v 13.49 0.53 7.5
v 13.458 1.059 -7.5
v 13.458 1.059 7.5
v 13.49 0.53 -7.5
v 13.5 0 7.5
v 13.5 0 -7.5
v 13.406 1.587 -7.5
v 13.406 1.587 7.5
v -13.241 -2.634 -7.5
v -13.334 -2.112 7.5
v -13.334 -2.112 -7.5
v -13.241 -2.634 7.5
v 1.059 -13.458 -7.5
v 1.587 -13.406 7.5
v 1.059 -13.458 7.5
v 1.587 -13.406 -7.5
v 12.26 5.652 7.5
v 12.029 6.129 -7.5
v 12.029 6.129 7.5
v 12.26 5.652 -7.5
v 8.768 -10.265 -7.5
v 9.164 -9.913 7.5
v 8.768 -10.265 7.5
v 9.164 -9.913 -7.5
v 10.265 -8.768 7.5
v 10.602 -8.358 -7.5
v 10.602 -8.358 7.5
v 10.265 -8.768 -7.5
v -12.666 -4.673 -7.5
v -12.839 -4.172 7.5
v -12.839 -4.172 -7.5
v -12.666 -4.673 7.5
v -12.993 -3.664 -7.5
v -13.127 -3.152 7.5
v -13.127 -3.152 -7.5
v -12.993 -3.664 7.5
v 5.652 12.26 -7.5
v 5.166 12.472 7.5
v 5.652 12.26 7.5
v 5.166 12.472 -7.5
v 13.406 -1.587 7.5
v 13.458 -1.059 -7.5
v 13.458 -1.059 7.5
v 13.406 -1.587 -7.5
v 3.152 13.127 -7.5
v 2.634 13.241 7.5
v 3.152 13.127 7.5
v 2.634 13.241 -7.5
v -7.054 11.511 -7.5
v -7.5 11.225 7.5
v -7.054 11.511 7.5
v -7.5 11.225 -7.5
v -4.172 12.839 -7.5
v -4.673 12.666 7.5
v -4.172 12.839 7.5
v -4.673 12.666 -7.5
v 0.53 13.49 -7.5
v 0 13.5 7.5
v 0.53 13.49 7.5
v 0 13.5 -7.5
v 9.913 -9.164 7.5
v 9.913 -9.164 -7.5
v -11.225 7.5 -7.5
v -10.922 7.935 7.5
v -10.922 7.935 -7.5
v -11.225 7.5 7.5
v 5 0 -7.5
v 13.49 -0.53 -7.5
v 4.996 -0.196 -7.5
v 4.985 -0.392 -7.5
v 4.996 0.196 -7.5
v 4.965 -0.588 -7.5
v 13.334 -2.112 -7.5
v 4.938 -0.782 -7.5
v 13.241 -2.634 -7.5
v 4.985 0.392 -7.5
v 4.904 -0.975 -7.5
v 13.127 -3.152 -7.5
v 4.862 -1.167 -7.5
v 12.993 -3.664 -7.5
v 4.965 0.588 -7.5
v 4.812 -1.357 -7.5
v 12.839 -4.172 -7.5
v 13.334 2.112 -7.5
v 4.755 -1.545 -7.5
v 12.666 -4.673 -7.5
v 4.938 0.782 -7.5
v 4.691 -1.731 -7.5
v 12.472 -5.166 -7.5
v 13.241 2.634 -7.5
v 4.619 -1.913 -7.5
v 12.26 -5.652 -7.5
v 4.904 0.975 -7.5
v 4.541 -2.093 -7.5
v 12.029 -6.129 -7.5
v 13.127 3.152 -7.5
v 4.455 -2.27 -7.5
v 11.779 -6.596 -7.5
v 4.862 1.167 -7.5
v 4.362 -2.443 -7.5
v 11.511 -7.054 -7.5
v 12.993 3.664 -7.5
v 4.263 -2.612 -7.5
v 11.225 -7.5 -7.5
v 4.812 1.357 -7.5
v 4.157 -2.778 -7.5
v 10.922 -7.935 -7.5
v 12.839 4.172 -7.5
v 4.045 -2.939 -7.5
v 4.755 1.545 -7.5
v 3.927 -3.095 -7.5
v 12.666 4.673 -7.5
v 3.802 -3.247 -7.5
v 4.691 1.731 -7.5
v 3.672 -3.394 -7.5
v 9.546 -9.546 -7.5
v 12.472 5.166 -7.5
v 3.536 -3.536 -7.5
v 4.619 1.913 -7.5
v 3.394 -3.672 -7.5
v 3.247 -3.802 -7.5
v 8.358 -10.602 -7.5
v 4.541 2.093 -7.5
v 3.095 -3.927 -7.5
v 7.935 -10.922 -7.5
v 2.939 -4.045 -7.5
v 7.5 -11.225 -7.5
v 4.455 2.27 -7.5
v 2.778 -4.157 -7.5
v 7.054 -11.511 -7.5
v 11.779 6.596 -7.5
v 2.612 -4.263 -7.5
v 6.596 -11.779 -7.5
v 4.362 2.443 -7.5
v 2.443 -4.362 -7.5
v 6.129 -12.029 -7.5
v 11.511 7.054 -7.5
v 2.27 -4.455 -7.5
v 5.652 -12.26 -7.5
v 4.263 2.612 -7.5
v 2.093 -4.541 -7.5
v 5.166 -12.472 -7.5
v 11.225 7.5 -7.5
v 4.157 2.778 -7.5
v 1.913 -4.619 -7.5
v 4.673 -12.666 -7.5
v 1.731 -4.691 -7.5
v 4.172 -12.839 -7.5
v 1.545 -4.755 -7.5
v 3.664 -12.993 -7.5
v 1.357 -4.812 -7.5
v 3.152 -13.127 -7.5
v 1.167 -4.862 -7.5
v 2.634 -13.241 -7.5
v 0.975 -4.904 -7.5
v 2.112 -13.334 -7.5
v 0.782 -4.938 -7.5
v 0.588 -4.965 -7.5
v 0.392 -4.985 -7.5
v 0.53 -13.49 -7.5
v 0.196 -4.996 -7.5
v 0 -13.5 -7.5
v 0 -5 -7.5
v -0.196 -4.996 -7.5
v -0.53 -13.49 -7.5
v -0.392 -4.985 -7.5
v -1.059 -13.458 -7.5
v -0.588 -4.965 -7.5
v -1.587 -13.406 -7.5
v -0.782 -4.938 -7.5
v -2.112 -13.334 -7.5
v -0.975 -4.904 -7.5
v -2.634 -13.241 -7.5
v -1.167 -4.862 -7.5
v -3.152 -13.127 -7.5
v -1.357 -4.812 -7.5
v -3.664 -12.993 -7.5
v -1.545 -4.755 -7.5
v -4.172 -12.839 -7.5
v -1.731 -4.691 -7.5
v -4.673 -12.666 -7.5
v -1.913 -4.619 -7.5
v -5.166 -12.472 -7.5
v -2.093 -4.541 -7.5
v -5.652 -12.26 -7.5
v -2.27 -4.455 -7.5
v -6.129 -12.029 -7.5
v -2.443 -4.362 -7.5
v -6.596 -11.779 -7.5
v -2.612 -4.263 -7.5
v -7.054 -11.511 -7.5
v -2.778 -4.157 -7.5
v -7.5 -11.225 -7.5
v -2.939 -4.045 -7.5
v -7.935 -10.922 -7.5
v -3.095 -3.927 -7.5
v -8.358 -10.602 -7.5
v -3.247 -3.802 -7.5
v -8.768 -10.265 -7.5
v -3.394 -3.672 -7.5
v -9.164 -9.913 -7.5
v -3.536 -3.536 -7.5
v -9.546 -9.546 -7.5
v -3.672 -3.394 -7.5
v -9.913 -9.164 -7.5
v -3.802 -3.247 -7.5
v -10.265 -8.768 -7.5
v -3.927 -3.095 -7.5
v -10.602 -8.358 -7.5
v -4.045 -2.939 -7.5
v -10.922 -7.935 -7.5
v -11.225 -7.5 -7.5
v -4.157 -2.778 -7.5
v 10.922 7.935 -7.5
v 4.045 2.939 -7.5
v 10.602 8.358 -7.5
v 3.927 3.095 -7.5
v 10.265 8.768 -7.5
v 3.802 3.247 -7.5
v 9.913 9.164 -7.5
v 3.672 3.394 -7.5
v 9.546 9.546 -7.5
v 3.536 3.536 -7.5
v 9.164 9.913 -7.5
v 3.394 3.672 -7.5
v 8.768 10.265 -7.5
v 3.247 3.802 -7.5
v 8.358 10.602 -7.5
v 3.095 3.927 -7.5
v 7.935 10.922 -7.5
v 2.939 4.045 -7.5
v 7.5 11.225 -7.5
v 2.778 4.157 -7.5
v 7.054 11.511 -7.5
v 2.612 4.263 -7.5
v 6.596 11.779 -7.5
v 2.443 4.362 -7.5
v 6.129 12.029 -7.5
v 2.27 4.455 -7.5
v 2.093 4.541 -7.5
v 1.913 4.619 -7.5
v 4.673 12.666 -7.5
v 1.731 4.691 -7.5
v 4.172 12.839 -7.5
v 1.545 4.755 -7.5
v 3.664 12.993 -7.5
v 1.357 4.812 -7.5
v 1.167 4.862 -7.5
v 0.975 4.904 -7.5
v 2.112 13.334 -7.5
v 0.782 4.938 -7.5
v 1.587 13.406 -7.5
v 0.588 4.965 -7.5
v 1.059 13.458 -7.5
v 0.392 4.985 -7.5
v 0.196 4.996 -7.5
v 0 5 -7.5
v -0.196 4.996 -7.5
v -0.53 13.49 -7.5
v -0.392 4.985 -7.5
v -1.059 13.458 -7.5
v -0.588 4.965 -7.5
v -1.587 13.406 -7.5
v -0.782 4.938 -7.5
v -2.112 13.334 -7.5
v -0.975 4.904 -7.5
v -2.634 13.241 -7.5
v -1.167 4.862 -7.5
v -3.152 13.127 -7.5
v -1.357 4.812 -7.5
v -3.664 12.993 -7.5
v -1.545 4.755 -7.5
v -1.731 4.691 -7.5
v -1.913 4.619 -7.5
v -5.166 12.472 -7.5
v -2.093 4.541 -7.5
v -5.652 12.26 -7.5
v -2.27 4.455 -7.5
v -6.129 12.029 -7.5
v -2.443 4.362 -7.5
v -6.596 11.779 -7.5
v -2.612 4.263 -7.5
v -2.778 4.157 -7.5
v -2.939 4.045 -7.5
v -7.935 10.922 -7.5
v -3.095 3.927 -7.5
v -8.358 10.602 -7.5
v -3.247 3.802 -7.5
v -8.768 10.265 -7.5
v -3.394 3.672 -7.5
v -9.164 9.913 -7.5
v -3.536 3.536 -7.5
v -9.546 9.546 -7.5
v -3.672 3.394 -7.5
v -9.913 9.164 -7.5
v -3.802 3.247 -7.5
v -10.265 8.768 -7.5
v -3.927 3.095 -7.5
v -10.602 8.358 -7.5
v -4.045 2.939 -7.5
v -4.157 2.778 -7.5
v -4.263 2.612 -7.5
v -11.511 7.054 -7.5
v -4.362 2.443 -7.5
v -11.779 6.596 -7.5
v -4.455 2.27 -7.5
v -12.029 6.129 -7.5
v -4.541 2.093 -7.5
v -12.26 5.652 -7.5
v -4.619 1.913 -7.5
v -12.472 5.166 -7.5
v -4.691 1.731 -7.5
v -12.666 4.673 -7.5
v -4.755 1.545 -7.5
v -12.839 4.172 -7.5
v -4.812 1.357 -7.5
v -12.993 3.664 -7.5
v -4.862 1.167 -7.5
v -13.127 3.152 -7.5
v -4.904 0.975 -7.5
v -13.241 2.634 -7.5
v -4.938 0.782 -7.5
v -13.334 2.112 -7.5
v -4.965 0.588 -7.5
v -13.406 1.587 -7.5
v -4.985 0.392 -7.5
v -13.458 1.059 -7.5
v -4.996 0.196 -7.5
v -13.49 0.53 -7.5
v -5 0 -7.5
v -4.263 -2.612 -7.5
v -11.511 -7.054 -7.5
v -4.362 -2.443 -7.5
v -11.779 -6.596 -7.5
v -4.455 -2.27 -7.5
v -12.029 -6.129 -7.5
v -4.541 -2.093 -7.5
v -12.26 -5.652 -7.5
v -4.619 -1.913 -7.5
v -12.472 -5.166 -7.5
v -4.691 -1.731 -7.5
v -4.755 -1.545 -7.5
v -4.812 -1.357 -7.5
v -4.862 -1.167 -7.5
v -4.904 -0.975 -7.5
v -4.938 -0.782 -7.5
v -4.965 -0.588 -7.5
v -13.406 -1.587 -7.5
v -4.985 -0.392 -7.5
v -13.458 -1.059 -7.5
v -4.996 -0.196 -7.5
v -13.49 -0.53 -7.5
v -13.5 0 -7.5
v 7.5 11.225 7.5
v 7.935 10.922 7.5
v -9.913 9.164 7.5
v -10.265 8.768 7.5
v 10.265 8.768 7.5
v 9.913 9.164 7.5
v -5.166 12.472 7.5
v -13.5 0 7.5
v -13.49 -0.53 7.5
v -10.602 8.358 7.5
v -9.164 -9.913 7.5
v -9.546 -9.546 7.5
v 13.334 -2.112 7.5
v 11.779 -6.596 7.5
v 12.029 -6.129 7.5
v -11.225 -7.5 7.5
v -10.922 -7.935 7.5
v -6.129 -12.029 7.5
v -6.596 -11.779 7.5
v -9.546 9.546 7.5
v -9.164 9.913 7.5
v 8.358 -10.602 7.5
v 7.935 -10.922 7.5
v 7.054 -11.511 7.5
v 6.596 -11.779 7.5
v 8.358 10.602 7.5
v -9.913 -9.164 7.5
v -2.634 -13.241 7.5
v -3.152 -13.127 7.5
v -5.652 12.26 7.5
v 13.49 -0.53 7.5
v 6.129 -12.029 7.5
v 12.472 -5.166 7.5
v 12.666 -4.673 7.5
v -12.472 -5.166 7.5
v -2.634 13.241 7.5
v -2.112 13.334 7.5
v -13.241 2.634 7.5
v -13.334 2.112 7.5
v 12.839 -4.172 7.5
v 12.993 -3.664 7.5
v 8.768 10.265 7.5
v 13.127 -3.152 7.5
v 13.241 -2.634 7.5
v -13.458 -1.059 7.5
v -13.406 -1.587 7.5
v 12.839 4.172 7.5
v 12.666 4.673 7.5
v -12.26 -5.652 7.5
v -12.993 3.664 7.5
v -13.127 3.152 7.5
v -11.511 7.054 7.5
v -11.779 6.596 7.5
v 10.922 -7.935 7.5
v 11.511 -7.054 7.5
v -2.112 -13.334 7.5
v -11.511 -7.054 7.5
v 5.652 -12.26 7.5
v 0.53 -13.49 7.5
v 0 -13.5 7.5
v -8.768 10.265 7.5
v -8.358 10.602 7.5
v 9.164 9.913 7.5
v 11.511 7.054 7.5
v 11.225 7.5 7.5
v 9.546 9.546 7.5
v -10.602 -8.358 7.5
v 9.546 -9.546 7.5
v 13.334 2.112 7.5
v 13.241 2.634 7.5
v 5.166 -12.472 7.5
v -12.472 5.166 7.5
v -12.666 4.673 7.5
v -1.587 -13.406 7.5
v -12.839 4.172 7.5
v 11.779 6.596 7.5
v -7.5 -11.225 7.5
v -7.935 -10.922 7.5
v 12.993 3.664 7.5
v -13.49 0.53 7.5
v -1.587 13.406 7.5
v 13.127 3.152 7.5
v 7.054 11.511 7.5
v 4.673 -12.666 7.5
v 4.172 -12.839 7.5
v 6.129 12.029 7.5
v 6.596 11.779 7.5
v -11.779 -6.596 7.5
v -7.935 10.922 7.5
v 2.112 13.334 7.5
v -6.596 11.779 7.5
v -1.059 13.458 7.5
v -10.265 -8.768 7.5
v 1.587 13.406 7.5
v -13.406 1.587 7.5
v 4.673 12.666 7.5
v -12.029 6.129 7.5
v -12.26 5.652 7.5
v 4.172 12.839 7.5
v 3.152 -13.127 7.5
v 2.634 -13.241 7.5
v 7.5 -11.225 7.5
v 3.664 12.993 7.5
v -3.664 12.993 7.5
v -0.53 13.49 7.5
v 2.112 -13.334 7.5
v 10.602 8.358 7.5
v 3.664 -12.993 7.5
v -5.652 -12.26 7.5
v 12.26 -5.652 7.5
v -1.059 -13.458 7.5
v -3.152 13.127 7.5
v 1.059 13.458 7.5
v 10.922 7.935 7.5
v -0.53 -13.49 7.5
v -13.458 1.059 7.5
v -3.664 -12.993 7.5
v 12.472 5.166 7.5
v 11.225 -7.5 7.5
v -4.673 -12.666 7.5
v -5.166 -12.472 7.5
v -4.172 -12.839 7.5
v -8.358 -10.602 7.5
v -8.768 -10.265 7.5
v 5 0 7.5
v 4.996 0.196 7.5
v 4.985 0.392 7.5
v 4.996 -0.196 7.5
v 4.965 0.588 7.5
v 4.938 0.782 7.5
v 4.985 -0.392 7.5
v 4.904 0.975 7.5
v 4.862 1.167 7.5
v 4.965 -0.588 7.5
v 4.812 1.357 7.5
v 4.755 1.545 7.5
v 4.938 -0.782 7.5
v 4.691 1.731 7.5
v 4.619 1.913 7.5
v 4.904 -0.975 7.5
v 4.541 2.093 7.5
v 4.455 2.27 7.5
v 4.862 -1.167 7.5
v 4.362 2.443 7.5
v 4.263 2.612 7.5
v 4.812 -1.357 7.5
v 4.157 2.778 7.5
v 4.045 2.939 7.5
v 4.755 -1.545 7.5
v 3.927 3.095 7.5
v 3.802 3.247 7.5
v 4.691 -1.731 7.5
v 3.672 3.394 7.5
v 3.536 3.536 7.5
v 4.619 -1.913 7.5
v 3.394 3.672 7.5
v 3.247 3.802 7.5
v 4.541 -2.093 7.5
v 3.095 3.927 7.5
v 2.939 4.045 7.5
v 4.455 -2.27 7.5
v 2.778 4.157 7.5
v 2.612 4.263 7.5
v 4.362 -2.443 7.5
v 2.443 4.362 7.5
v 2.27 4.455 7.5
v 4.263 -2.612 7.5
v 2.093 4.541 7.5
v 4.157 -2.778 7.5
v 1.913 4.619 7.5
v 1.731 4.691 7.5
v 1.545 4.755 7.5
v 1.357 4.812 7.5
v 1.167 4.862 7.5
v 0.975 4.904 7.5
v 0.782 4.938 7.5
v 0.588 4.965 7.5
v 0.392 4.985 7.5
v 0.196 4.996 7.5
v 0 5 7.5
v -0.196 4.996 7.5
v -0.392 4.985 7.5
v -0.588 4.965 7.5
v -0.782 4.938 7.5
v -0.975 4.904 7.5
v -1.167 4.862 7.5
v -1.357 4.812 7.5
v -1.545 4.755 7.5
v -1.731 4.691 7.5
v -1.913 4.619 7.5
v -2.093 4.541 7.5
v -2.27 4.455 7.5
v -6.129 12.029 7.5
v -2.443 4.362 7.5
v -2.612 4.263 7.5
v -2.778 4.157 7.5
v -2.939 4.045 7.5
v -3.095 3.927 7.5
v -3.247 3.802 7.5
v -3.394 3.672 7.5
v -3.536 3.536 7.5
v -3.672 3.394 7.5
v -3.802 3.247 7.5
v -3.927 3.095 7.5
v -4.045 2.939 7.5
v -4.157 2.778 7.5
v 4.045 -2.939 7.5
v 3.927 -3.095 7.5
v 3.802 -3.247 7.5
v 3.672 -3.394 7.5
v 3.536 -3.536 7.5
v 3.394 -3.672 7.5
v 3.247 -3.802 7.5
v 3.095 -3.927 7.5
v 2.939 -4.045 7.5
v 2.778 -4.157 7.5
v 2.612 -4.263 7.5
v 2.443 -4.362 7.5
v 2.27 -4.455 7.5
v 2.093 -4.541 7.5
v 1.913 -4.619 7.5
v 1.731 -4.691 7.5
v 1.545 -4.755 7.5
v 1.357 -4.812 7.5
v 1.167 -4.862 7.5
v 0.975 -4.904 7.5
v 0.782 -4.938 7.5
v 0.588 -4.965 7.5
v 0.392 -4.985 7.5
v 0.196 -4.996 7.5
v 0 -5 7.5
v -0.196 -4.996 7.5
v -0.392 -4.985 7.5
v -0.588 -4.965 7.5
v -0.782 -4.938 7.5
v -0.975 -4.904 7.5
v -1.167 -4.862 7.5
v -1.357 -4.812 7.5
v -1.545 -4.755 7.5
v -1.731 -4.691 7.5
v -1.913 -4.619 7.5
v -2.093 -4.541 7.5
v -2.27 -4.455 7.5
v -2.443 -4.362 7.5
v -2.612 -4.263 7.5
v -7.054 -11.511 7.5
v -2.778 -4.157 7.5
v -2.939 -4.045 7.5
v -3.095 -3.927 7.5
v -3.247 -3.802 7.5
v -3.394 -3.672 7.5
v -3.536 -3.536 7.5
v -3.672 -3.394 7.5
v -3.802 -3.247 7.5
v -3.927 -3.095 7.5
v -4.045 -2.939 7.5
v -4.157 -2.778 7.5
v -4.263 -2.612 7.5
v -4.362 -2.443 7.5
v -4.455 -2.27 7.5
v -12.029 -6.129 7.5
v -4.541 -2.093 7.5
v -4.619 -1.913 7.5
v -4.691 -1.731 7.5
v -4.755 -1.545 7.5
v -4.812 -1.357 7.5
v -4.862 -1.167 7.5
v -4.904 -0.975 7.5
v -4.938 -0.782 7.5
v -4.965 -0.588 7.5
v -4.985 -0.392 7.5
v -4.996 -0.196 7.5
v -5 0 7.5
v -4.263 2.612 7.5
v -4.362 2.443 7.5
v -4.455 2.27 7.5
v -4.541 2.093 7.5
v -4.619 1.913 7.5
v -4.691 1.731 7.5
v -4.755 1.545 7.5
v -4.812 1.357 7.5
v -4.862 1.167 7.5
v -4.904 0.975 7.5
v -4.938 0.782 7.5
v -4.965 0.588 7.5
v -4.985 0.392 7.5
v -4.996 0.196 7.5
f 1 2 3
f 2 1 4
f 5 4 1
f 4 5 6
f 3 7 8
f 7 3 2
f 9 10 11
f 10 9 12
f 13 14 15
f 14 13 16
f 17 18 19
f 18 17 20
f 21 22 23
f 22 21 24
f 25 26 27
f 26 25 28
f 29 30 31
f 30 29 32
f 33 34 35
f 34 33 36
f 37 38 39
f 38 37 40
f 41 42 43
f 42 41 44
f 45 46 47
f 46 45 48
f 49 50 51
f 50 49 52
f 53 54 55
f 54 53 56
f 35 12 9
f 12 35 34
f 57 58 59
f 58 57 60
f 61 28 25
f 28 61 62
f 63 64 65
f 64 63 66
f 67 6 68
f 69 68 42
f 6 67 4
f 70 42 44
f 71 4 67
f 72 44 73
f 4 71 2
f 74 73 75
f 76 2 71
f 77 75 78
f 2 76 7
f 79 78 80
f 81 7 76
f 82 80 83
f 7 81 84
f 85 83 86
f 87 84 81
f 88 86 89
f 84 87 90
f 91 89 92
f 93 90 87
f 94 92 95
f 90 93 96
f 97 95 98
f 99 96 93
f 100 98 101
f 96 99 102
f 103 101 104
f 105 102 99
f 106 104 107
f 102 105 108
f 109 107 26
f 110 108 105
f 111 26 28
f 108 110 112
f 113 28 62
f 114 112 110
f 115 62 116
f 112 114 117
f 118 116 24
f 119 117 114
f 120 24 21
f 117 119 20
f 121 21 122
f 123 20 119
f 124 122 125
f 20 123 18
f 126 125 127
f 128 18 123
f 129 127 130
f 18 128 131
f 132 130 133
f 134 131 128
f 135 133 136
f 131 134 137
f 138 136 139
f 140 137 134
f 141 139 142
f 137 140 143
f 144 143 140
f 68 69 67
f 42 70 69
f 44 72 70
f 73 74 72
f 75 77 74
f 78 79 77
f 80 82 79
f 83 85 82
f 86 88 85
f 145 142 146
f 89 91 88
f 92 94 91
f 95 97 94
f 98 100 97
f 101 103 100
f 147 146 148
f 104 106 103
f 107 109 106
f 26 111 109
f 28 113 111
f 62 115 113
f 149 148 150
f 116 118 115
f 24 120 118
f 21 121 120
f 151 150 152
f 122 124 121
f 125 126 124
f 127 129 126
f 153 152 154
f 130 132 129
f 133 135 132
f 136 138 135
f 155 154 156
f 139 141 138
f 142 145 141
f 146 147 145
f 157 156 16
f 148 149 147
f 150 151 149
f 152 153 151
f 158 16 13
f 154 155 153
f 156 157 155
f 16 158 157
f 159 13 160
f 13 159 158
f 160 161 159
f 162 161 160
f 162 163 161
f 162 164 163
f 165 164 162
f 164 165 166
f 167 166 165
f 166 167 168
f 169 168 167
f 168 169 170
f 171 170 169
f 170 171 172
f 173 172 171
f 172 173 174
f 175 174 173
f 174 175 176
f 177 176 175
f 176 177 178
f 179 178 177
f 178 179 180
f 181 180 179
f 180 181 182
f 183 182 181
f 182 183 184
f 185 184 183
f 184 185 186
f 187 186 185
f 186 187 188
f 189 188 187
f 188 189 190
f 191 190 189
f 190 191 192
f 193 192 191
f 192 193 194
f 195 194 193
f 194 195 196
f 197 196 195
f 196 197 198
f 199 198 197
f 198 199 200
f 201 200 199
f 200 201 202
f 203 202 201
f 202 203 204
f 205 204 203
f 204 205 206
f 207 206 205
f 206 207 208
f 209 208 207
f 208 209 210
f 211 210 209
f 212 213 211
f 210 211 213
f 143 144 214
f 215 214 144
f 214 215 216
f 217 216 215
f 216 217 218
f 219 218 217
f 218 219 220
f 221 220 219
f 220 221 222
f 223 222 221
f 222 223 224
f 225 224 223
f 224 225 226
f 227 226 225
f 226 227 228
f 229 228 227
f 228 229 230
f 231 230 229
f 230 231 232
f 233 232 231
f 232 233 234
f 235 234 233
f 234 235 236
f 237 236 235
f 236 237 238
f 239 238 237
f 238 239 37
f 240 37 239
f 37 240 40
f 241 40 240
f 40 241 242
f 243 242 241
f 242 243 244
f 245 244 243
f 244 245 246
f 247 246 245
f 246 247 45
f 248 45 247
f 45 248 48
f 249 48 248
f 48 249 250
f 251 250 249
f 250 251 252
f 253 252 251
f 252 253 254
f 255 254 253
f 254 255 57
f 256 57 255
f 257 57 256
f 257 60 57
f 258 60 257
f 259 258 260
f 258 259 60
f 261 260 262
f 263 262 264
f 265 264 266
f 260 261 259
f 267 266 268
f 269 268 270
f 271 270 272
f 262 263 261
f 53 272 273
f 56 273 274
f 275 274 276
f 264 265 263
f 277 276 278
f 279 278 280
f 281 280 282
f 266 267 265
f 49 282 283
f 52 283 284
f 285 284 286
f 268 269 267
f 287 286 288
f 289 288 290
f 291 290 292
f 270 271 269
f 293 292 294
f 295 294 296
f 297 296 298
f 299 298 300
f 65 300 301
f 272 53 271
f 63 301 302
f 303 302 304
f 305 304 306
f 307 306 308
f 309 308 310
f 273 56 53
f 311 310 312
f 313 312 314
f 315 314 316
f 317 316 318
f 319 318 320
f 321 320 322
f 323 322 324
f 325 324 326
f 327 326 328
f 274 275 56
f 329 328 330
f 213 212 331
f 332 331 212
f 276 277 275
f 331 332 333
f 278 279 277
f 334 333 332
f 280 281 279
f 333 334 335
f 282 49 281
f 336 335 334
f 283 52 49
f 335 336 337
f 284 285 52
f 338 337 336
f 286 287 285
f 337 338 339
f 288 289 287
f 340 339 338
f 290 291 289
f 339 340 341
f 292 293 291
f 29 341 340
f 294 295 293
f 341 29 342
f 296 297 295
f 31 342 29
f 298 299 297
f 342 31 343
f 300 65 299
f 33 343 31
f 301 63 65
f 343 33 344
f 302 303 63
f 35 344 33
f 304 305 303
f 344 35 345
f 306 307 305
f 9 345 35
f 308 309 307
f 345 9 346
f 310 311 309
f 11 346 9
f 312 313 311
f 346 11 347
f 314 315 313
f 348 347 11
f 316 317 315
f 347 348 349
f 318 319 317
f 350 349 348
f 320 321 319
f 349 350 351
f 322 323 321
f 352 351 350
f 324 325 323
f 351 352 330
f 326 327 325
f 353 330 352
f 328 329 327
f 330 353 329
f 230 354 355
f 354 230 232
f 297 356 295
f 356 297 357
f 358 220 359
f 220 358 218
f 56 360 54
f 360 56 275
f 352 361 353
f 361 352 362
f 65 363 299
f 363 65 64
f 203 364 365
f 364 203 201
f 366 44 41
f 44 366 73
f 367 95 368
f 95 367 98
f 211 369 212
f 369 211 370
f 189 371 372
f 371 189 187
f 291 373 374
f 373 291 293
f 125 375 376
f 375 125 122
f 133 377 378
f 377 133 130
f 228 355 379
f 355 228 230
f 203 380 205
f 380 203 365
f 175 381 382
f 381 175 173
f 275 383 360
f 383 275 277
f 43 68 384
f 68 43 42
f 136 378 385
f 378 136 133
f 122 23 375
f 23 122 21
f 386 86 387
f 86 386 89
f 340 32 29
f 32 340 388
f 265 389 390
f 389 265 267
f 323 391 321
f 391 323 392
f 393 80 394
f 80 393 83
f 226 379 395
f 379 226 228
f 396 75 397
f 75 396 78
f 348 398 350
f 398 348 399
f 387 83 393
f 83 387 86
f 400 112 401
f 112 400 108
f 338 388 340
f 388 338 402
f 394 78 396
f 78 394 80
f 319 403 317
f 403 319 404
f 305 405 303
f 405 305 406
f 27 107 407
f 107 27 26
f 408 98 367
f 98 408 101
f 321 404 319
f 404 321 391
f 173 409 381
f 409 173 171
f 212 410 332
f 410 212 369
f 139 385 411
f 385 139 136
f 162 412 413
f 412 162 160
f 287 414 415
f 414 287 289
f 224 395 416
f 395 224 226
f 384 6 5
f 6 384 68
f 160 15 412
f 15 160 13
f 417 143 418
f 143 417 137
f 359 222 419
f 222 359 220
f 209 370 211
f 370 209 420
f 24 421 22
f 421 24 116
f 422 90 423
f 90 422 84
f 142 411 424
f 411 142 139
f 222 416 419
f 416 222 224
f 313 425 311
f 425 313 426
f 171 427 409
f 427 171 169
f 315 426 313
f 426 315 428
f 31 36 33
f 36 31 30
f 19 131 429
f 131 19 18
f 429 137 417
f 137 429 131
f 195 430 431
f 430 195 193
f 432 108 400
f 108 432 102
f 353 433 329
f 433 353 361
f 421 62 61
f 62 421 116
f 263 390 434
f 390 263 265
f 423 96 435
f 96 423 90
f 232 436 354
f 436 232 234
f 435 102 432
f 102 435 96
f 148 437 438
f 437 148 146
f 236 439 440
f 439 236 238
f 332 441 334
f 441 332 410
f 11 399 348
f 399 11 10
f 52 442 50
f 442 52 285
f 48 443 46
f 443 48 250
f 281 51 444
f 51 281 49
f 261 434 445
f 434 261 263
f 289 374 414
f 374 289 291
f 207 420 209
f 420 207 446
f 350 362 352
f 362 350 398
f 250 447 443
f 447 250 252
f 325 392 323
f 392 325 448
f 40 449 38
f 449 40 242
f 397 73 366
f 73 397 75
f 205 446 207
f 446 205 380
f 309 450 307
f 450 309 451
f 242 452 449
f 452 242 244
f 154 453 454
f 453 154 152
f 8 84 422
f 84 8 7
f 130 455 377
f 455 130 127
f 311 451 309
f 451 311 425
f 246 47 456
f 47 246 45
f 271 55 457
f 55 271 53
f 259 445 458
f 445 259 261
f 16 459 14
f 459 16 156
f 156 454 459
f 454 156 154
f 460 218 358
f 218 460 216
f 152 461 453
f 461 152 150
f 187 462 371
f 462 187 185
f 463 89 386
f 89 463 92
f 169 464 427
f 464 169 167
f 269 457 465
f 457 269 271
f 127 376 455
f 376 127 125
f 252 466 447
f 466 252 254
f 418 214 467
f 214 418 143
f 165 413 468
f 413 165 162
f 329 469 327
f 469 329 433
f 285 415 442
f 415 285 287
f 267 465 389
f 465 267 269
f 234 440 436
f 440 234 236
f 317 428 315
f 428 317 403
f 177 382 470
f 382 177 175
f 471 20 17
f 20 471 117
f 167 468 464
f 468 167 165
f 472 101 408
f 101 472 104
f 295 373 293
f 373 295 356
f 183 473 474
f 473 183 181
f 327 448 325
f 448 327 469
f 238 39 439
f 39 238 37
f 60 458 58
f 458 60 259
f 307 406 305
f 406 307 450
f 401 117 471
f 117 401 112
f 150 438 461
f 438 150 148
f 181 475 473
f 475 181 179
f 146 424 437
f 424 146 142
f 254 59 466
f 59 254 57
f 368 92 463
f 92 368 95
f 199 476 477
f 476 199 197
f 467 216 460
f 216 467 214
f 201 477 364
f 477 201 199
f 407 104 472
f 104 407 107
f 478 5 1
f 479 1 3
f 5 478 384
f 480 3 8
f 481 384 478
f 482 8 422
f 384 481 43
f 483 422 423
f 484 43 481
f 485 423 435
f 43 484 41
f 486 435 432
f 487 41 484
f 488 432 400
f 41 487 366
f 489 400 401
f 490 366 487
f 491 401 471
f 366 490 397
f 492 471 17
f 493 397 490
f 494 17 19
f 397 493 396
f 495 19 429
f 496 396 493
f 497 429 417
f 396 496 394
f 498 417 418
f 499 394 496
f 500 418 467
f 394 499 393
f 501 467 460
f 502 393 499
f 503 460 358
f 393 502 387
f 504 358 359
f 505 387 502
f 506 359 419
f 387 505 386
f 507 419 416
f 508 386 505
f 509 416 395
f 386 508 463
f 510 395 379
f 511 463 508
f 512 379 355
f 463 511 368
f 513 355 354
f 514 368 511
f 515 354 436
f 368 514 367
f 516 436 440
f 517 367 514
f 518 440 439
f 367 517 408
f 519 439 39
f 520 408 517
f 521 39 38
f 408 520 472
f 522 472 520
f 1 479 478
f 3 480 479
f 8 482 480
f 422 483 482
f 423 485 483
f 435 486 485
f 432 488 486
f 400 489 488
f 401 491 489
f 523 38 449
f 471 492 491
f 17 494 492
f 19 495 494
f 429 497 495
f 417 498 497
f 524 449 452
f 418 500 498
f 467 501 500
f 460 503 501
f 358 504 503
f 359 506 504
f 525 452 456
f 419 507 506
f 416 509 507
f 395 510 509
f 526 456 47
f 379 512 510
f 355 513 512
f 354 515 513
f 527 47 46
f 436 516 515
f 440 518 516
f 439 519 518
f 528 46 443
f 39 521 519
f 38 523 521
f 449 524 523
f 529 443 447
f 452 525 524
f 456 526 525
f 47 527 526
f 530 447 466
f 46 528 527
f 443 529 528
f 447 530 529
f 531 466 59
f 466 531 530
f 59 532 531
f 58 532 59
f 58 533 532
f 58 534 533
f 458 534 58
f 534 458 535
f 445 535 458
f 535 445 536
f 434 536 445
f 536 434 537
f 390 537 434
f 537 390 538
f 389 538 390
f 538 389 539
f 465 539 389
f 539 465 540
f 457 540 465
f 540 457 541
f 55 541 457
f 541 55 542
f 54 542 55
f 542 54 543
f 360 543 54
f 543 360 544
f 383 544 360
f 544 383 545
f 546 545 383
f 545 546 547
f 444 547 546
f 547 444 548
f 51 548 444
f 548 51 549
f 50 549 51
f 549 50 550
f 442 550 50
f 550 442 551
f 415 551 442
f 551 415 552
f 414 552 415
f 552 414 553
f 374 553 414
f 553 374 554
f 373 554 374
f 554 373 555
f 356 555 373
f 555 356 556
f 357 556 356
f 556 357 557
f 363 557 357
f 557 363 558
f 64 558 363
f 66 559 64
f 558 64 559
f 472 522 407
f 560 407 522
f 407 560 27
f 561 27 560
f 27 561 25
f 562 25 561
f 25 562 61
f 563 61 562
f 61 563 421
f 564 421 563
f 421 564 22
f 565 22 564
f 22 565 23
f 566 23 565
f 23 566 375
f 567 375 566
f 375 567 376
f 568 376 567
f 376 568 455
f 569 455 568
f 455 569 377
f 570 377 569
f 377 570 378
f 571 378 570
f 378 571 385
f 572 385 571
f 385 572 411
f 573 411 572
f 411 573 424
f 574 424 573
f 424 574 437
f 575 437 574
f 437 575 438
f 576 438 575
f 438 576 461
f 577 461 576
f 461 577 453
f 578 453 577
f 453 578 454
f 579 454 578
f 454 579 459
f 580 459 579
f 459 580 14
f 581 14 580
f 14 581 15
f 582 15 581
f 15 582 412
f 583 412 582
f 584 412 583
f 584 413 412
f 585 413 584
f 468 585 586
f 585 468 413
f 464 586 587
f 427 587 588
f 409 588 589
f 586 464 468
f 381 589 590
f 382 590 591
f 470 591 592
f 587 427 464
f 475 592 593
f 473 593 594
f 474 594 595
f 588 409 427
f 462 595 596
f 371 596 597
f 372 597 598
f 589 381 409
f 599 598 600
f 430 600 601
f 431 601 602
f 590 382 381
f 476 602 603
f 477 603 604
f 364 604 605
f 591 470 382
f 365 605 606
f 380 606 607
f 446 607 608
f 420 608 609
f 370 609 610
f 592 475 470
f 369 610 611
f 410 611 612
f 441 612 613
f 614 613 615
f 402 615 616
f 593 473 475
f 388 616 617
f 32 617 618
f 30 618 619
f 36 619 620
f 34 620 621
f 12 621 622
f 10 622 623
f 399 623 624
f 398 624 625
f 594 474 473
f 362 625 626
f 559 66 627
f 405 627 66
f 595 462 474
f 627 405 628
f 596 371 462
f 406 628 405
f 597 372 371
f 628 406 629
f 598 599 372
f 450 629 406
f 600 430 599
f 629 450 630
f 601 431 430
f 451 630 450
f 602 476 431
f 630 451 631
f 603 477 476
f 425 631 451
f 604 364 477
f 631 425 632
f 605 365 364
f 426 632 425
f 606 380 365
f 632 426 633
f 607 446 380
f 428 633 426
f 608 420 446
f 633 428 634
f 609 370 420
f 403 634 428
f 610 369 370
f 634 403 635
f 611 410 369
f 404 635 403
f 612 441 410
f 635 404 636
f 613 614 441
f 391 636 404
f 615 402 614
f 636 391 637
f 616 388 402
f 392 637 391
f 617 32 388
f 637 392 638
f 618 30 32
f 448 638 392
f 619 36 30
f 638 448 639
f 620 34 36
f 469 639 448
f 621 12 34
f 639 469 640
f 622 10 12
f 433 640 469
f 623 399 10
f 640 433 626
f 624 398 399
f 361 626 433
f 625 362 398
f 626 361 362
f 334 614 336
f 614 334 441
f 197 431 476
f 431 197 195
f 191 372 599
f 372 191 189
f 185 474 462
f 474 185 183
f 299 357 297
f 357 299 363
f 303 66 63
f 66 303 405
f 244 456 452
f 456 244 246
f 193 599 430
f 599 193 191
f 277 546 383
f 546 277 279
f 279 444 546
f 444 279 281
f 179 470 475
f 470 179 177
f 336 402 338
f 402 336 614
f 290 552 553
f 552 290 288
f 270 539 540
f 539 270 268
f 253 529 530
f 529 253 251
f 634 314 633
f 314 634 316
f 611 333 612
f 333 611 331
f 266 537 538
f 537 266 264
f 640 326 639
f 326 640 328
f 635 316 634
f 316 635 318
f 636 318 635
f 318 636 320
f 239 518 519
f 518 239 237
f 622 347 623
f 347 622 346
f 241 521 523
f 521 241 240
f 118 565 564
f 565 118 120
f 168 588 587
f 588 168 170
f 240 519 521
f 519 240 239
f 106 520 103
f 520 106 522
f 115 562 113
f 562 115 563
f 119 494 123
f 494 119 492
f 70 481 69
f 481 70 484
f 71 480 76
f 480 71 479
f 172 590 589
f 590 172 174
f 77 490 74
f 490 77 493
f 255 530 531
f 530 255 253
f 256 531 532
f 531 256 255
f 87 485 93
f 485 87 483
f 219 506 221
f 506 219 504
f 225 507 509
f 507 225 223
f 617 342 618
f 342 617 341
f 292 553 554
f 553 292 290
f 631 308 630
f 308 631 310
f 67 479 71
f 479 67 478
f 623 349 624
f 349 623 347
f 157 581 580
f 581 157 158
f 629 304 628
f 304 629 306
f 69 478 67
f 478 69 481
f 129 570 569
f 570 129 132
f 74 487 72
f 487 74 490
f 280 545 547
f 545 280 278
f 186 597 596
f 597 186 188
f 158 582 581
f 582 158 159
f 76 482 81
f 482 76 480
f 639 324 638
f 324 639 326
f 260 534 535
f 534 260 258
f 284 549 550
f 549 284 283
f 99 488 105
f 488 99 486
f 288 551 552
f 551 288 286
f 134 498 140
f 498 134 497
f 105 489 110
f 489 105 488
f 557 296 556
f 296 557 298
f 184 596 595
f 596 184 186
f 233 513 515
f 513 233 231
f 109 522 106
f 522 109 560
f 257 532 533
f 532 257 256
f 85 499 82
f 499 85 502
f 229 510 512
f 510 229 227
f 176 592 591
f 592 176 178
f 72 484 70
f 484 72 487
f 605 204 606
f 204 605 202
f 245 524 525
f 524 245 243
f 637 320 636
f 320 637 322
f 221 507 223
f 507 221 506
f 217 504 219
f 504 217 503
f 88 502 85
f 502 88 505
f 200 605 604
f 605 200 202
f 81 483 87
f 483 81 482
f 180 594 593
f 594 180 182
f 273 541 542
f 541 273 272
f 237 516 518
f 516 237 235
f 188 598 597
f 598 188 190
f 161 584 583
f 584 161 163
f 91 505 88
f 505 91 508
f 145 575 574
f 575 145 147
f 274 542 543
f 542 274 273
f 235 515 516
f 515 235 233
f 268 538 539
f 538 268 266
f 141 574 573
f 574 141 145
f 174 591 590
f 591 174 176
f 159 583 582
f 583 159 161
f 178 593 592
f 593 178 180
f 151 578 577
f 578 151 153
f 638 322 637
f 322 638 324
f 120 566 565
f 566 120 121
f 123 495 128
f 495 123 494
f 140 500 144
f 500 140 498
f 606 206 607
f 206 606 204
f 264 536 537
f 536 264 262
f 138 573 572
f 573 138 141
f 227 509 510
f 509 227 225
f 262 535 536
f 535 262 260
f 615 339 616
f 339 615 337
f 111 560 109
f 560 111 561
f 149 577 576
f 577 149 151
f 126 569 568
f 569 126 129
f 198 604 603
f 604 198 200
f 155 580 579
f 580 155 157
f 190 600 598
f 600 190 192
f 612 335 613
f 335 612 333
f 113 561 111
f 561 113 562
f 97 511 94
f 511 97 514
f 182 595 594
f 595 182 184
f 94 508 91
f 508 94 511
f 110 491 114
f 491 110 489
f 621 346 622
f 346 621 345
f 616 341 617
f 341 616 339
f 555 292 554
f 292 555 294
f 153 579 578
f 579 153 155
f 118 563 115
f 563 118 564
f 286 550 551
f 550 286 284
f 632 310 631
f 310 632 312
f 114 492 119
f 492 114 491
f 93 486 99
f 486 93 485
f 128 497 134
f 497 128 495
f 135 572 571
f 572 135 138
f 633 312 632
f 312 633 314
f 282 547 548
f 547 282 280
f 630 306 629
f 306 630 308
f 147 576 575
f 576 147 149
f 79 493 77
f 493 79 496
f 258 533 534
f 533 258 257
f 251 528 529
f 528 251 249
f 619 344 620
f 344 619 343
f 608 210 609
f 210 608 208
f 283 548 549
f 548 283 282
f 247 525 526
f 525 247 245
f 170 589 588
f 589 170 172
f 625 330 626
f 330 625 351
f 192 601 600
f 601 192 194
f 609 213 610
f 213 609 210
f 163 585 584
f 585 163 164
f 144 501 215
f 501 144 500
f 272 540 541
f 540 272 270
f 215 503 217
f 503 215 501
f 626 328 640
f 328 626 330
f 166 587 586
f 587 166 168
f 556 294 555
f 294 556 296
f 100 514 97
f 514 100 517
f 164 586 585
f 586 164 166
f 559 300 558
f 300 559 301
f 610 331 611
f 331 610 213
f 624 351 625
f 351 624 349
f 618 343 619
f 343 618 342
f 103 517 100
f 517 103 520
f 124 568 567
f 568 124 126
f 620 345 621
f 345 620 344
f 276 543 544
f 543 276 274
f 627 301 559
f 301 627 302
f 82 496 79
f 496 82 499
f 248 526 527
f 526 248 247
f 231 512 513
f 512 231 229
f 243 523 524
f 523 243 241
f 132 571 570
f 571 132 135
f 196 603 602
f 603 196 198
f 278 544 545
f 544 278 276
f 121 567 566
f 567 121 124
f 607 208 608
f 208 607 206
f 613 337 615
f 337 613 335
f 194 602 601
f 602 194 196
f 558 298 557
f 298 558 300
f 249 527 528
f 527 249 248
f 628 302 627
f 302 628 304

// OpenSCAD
$fn=160;

height=15;
width=27;
inner_width=10;

difference()
{
    union()
    {
        //middle bits
        cylinder(h=height,d=width,center=true);
    }
    //intersection
    cylinder(h=height+1,d=inner_width,center=true);
 }
